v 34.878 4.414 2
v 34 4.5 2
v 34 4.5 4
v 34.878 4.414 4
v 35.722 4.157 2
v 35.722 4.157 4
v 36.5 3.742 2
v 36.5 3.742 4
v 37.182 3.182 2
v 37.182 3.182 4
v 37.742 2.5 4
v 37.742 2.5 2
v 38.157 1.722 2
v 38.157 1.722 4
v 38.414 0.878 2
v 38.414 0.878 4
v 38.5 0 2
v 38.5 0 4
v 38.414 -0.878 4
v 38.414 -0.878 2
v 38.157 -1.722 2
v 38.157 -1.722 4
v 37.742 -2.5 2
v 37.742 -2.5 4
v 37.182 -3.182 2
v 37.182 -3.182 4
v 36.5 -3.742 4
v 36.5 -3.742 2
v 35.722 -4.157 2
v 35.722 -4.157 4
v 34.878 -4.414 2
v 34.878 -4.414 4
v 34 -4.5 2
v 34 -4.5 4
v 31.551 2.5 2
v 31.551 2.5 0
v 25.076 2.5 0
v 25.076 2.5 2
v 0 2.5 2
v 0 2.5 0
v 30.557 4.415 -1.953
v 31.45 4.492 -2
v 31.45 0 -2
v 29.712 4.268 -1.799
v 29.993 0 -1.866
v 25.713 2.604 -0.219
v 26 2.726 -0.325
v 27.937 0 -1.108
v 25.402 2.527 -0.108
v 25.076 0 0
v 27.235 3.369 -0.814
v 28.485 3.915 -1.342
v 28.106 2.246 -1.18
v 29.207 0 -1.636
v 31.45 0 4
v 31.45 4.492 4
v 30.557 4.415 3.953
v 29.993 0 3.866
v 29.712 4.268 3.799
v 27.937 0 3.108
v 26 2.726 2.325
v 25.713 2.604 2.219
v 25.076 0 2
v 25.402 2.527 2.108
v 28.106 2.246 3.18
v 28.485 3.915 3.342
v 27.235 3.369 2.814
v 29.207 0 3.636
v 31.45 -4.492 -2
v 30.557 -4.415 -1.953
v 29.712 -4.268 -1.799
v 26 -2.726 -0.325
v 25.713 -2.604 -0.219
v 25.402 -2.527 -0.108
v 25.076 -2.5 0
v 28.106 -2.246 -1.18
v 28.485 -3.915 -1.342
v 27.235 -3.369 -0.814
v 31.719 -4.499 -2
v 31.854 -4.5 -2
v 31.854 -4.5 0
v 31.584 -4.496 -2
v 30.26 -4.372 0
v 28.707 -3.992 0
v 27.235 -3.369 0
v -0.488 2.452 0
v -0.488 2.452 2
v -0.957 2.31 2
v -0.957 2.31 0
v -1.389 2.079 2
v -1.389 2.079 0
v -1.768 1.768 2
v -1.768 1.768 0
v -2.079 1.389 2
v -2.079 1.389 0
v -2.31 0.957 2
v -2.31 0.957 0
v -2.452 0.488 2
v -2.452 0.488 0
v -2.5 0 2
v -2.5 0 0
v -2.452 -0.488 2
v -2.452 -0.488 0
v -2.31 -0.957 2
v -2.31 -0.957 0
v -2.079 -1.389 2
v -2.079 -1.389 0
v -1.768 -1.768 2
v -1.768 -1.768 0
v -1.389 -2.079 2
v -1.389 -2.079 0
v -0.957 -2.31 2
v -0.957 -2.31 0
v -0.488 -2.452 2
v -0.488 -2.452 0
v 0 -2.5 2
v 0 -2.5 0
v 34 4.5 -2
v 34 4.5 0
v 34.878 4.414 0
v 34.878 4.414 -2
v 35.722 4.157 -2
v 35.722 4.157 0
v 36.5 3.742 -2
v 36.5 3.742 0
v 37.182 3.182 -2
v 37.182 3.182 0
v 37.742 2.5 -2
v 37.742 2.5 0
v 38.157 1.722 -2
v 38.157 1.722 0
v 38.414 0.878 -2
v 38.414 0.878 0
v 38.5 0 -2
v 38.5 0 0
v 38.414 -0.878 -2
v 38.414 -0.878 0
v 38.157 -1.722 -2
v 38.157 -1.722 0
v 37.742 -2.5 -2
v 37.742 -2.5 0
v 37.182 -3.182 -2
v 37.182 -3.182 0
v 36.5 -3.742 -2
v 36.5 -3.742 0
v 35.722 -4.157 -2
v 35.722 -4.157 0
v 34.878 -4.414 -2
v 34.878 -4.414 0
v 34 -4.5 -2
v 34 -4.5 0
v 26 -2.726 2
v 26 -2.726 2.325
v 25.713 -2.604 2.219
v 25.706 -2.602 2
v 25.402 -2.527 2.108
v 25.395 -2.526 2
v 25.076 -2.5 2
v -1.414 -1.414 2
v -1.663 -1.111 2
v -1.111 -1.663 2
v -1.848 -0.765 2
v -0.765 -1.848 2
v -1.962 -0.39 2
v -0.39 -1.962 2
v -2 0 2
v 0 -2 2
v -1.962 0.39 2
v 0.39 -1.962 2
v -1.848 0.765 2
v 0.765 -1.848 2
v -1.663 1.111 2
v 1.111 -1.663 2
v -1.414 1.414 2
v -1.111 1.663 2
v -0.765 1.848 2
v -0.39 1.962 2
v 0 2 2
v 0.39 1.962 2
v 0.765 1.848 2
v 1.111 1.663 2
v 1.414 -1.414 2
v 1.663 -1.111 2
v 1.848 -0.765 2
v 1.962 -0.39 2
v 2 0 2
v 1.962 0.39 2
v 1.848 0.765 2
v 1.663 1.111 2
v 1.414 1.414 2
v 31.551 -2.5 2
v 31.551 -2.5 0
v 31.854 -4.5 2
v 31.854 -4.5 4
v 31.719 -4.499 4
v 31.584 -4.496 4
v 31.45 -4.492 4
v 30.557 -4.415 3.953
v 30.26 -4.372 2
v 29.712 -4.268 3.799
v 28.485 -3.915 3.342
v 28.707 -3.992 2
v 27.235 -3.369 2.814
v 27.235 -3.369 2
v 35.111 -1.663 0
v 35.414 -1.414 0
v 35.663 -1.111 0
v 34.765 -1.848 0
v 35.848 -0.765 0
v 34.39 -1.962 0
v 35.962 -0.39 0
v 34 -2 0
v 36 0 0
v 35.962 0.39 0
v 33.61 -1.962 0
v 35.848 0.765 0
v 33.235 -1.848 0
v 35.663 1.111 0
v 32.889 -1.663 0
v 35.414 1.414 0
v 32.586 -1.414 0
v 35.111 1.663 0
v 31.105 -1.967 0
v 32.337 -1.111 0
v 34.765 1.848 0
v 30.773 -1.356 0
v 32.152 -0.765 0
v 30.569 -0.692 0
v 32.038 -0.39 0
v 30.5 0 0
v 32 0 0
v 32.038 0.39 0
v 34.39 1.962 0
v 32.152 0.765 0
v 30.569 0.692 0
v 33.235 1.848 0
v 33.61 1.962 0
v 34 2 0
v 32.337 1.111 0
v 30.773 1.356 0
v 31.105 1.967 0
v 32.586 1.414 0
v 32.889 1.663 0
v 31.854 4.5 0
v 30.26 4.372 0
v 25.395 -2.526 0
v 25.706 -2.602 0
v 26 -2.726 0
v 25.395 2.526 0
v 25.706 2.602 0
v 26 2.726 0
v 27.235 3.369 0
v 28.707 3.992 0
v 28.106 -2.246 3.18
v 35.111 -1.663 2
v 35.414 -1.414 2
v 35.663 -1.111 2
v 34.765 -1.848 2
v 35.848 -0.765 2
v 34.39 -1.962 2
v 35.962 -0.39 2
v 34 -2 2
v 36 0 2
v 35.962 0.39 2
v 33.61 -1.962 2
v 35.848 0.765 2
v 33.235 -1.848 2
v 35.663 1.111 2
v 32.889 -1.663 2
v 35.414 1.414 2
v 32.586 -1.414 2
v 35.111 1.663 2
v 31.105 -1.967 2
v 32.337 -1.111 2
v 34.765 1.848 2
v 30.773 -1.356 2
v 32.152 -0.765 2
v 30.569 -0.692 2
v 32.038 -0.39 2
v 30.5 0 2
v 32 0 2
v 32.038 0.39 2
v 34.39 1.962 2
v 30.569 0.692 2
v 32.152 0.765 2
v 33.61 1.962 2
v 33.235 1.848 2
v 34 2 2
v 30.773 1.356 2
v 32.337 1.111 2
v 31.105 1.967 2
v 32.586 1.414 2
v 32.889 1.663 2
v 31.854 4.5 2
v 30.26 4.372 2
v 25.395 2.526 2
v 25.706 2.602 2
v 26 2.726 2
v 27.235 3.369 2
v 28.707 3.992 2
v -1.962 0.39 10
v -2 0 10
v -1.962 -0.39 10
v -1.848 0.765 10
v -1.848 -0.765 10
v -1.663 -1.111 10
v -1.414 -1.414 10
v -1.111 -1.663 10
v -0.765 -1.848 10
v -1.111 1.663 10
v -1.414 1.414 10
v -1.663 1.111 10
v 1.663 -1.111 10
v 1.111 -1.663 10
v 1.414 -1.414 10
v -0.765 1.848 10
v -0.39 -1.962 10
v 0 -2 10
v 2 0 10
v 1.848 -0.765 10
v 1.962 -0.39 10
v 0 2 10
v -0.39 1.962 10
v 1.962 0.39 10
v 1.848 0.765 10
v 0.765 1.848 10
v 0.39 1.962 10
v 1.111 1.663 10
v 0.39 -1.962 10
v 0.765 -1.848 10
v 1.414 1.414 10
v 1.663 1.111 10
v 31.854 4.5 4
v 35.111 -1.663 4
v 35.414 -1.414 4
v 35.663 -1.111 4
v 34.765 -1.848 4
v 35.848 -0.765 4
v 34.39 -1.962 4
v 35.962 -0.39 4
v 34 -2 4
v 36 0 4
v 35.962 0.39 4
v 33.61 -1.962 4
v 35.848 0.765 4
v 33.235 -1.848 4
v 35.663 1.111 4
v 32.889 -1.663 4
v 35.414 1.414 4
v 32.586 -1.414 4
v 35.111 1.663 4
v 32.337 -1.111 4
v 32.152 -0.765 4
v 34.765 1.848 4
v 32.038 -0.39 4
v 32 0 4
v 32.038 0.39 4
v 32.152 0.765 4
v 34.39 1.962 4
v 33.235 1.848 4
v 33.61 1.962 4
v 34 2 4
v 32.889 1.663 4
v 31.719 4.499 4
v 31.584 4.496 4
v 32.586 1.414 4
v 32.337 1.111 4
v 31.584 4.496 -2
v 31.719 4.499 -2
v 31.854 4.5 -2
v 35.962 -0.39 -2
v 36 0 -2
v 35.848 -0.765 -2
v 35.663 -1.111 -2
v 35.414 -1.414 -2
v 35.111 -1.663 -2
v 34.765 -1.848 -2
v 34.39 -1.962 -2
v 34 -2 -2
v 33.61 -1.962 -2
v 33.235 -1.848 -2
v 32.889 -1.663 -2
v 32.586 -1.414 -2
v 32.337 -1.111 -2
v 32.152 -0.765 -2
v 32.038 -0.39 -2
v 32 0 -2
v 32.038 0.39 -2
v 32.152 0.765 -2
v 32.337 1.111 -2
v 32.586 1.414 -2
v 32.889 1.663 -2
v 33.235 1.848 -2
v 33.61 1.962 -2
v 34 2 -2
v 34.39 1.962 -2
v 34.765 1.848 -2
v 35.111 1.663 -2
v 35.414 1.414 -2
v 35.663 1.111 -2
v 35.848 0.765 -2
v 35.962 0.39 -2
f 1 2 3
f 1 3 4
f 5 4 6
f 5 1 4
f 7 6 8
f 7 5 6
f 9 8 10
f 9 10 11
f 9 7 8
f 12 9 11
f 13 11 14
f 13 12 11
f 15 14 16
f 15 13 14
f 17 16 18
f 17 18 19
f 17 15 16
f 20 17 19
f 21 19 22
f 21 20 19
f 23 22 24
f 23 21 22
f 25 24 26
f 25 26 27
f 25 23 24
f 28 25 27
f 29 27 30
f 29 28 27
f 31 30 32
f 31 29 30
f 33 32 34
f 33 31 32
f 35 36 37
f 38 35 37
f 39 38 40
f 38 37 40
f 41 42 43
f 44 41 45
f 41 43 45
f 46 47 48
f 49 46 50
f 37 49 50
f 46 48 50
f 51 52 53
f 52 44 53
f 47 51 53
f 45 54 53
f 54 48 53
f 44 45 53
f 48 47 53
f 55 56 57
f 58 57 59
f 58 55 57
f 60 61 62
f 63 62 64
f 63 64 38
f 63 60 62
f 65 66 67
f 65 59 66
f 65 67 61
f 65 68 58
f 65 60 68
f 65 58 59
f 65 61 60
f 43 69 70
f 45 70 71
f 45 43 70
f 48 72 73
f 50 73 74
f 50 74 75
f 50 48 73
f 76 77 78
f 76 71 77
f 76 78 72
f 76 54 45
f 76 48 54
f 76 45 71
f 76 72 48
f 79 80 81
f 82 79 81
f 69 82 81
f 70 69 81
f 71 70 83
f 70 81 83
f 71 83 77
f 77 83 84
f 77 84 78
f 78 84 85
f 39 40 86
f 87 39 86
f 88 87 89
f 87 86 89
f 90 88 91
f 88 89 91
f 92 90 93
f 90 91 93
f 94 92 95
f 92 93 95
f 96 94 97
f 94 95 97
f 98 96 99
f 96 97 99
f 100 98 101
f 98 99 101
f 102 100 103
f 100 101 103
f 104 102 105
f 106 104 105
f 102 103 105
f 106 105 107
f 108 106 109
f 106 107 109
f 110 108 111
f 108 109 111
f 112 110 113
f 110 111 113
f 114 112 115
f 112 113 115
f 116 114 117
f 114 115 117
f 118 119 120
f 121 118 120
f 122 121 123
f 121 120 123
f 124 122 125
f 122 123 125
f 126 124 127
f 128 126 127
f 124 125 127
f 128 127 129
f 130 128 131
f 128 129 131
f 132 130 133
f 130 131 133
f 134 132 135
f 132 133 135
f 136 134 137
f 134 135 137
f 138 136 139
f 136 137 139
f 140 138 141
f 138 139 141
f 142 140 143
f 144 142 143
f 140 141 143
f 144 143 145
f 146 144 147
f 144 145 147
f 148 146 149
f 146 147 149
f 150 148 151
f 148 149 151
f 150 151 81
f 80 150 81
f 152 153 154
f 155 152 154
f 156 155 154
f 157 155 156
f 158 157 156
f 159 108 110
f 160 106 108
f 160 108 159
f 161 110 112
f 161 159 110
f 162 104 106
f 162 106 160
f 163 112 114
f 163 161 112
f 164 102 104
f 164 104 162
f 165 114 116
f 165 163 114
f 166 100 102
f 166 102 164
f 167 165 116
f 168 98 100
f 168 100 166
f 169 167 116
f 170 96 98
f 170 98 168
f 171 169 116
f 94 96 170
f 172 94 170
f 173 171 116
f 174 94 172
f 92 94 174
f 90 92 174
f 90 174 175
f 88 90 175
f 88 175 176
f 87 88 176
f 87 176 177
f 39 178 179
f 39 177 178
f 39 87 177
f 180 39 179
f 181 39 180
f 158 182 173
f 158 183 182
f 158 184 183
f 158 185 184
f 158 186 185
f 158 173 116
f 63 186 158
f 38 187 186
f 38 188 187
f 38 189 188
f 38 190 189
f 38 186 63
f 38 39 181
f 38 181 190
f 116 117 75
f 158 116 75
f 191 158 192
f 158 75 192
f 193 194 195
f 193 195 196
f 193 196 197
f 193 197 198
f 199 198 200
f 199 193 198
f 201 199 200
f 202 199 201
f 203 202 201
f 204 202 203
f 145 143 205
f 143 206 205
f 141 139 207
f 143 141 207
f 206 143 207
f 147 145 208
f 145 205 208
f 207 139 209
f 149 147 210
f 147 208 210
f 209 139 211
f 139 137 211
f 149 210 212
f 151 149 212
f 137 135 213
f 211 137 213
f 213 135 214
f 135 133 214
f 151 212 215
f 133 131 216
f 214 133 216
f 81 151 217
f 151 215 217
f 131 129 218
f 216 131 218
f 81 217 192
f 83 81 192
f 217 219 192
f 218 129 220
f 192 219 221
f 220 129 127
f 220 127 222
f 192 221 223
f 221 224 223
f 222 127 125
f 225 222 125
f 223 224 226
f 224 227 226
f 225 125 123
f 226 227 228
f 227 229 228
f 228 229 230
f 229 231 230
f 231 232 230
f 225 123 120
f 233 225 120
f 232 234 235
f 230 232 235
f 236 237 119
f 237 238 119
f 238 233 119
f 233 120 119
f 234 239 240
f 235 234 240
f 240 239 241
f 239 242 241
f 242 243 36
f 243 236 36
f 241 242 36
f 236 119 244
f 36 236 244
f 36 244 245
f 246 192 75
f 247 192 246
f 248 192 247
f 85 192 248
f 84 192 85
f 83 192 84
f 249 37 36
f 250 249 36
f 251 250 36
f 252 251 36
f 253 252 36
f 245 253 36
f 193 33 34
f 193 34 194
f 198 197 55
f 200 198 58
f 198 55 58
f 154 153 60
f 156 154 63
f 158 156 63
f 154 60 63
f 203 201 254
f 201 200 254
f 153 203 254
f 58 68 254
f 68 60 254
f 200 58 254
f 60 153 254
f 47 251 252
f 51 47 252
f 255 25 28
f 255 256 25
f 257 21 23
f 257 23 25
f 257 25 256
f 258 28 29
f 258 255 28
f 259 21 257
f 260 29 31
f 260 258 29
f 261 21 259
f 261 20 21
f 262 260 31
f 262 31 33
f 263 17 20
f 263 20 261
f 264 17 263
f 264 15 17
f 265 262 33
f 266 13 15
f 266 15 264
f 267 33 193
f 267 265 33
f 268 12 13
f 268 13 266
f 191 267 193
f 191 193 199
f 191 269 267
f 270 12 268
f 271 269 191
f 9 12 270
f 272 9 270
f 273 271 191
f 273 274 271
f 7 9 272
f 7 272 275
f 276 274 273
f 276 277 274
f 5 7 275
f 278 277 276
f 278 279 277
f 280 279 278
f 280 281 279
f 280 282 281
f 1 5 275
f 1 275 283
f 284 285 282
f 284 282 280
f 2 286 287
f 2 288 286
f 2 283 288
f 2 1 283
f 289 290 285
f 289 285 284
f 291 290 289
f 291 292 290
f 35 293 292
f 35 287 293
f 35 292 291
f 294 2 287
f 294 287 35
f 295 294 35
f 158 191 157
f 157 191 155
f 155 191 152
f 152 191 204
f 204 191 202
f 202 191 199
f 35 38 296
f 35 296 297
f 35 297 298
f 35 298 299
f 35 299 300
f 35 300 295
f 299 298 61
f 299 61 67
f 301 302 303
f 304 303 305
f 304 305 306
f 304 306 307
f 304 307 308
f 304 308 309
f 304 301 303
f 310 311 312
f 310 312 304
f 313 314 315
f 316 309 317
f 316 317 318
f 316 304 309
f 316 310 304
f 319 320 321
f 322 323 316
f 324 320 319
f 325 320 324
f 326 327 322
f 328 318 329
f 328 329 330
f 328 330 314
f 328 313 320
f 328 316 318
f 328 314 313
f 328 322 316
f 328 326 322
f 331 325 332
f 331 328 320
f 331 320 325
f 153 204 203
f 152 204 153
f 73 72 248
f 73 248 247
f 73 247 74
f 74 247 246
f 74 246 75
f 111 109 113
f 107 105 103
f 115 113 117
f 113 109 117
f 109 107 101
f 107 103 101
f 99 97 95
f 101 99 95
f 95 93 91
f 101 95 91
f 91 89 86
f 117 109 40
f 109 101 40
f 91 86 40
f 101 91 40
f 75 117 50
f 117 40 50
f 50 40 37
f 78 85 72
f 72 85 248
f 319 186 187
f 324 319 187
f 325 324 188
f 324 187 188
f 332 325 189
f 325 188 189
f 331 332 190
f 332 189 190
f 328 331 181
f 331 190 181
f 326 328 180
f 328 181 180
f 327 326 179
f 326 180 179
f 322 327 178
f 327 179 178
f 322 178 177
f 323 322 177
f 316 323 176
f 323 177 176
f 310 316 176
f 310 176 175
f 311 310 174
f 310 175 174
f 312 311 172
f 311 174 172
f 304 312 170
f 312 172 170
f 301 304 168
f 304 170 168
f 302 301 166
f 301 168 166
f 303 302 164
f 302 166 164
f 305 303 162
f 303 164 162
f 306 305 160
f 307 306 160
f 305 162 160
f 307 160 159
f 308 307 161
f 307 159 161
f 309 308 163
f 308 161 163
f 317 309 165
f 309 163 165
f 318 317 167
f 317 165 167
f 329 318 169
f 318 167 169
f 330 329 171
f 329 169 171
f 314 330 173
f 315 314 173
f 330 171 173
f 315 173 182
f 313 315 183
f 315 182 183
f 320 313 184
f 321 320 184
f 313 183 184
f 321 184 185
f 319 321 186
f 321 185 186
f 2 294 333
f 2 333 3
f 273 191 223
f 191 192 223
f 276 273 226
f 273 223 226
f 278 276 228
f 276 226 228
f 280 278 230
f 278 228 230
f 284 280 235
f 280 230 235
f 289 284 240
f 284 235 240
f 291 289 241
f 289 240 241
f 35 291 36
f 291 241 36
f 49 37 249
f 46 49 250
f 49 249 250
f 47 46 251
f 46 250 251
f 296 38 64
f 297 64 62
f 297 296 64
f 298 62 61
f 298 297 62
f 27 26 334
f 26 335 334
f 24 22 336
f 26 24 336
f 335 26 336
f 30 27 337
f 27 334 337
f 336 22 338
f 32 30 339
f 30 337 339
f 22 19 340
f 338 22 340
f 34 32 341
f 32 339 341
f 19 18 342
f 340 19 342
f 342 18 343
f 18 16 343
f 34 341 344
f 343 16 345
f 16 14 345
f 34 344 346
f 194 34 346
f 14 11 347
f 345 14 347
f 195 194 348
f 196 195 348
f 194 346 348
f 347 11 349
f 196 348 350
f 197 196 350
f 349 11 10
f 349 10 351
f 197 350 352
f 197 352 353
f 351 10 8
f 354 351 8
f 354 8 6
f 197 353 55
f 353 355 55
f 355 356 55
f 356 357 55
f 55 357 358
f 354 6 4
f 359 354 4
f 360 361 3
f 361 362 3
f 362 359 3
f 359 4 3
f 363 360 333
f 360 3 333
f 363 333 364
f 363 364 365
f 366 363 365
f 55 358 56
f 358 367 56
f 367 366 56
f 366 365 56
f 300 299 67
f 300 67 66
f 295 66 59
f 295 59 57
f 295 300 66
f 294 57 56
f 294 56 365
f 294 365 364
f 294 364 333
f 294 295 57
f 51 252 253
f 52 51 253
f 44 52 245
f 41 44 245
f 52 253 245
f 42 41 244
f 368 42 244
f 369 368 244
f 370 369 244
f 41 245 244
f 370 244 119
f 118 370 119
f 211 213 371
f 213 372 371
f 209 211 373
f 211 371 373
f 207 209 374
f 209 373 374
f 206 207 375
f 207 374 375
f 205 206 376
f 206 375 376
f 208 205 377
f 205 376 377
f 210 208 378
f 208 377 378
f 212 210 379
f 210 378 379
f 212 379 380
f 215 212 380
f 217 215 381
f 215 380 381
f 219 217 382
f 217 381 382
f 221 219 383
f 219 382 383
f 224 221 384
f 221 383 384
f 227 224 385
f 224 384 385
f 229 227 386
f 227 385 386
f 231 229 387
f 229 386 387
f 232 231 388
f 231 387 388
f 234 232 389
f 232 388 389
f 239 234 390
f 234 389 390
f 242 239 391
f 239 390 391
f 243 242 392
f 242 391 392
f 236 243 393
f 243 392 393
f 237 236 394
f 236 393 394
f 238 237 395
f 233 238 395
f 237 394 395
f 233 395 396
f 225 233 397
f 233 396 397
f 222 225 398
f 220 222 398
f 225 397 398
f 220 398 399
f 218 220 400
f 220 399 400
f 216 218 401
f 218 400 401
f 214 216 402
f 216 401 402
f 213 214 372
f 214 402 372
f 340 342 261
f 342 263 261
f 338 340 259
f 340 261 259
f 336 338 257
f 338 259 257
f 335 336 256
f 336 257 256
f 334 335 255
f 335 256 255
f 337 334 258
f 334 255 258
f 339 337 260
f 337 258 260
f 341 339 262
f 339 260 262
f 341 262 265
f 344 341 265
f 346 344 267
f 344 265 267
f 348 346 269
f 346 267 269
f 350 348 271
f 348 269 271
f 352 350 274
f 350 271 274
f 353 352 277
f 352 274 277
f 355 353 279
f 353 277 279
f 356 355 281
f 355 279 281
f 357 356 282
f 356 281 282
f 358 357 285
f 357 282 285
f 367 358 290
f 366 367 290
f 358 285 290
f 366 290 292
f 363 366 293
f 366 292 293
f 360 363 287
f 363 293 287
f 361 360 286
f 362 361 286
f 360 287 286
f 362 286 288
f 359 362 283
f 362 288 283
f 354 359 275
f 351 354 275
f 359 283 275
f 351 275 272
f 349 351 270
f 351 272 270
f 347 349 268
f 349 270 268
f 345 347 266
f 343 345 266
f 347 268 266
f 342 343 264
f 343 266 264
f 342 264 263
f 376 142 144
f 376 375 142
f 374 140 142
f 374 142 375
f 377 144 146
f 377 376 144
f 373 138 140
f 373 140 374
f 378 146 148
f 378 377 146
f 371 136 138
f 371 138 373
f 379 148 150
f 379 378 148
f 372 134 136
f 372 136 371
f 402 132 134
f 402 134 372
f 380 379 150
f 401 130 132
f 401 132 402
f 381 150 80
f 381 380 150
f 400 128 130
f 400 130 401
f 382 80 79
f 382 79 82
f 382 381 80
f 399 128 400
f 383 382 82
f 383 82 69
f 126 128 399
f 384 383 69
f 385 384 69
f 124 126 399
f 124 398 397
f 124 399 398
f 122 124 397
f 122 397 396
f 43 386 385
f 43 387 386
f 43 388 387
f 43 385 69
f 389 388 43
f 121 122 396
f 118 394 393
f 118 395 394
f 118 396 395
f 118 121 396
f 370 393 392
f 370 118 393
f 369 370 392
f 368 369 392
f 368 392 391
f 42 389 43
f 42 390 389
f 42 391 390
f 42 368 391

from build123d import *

# Parameters (mm, degrees)
BOSS_EXTRUDE1_DEPTH = 2
SKETCH2_R           = 2
BOSS_EXTRUDE2_DEPTH = 8
SKETCH5_R           = 3.5
CUT_EXTRUDE2_DEPTH  = 5
BOSS_EXTRUDE3_DEPTH = 2
CUT_EXTRUDE1_DEPTH  = 5.5
SKETCH6_R           = 2
CUT_EXTRUDE3_DEPTH  = 11


with BuildPart() as part:
    # Sketch1 → Boss-Extrude1 (new body)
    with BuildSketch(Plane.XY):
        with BuildLine():
            Line((0, -2.5), (34, -2.5))
            ThreePointArc((34, -2.5), (36.5, 0), (34, 2.5))
            Line((34, 2.5), (0, 2.5))
            ThreePointArc((0, 2.5), (-2.5, 0), (0, -2.5))
        make_face()
    extrude(amount=BOSS_EXTRUDE1_DEPTH)

    # Sketch2 → Boss-Extrude2 (add)
    with BuildSketch(Plane.XY.offset(2)):
        Circle(SKETCH2_R)
    extrude(amount=BOSS_EXTRUDE2_DEPTH)

    # Sketch5 → Cut-Extrude2 (cut, symmetric)
    with BuildSketch(Plane(origin=(0, 0, 0), x_dir=(-1, 0, 0), z_dir=(0, 0, -1))):
        with Locations((-34, 0)):
            Circle(SKETCH5_R)
    extrude(amount=CUT_EXTRUDE2_DEPTH, both=True, mode=Mode.SUBTRACT)

    # Sketch3 → Boss-Extrude3 (add)
    with BuildSketch(Plane(origin=(0, 0, 0), x_dir=(-1, 0, 0), z_dir=(0, 0, -1))):
        with BuildLine():
            Line((-34, -4.5), (-31.853983948, -4.5))
            ThreePointArc((-31.853983948, -4.5), (-29.476132044, -4.213177664), (-27.234684348, -3.369164065))
            Line((-27.234684348, -3.369164065), (-26.000115193, -2.726167187))
            ThreePointArc((-26.000115193, -2.726167187), (-25.551825654, -2.557364467), (-25.076255273, -2.5))
            Line((-25.076255273, -2.5), (-25.076255273, 2.5))
            ThreePointArc((-25.076255273, 2.5), (-25.551825654, 2.557364467), (-26.000115193, 2.726167187))
            Line((-26.000115193, 2.726167187), (-27.234684348, 3.369164065))
            ThreePointArc((-27.234684348, 3.369164065), (-29.476132044, 4.213177664), (-31.853983948, 4.5))
            Line((-31.853983948, 4.5), (-34, 4.5))
            ThreePointArc((-34, 4.5), (-38.5, 0), (-34, -4.5))
        make_face()
    boss_extrude3 = extrude(amount=BOSS_EXTRUDE3_DEPTH)

    # Sketch4 → Cut-Extrude1 (cut, symmetric)
    with BuildSketch(Plane(origin=(0, 0, 0), x_dir=(1, 0, 0), z_dir=(0, 1, 0))):
        with BuildLine():
            Line((31.853983948, 2), (31.853983948, 3.174344261))
            Line((31.853983948, 3.174344261), (24.383890118, 3.174344261))
            Line((24.383890118, 3.174344261), (25.076255273, 0))
            add(Edge.make_bspline(
                [(31.853983948, 2), (29.962456018, 2.02071595), (29.16990367, 1.605069608), (25.966821868, 0.283607958), (25.076255273, 0)],
                knots=[0, 0, 0, 0, 0.608348739, 1, 1, 1, 1], degree=3))
        make_face()
    cut_extrude1 = extrude(amount=CUT_EXTRUDE1_DEPTH, both=True, mode=Mode.SUBTRACT)

    # Mirror1: Boss-Extrude3, Cut-Extrude1 across plane
    add(boss_extrude3.mirror(Plane.XY.offset(1)))
    add(cut_extrude1.mirror(Plane.XY.offset(1)), mode=Mode.SUBTRACT)

    # Sketch6 → Cut-Extrude3 (cut, symmetric)
    with BuildSketch(Plane(origin=(0, 0, -2), x_dir=(-1, 0, 0), z_dir=(0, 0, -1))):
        with Locations(Location((-34, 0, 0), (0, 0, 180))):
            Circle(SKETCH6_R)
    extrude(amount=CUT_EXTRUDE3_DEPTH, both=True, mode=Mode.SUBTRACT)


solid = part.part
